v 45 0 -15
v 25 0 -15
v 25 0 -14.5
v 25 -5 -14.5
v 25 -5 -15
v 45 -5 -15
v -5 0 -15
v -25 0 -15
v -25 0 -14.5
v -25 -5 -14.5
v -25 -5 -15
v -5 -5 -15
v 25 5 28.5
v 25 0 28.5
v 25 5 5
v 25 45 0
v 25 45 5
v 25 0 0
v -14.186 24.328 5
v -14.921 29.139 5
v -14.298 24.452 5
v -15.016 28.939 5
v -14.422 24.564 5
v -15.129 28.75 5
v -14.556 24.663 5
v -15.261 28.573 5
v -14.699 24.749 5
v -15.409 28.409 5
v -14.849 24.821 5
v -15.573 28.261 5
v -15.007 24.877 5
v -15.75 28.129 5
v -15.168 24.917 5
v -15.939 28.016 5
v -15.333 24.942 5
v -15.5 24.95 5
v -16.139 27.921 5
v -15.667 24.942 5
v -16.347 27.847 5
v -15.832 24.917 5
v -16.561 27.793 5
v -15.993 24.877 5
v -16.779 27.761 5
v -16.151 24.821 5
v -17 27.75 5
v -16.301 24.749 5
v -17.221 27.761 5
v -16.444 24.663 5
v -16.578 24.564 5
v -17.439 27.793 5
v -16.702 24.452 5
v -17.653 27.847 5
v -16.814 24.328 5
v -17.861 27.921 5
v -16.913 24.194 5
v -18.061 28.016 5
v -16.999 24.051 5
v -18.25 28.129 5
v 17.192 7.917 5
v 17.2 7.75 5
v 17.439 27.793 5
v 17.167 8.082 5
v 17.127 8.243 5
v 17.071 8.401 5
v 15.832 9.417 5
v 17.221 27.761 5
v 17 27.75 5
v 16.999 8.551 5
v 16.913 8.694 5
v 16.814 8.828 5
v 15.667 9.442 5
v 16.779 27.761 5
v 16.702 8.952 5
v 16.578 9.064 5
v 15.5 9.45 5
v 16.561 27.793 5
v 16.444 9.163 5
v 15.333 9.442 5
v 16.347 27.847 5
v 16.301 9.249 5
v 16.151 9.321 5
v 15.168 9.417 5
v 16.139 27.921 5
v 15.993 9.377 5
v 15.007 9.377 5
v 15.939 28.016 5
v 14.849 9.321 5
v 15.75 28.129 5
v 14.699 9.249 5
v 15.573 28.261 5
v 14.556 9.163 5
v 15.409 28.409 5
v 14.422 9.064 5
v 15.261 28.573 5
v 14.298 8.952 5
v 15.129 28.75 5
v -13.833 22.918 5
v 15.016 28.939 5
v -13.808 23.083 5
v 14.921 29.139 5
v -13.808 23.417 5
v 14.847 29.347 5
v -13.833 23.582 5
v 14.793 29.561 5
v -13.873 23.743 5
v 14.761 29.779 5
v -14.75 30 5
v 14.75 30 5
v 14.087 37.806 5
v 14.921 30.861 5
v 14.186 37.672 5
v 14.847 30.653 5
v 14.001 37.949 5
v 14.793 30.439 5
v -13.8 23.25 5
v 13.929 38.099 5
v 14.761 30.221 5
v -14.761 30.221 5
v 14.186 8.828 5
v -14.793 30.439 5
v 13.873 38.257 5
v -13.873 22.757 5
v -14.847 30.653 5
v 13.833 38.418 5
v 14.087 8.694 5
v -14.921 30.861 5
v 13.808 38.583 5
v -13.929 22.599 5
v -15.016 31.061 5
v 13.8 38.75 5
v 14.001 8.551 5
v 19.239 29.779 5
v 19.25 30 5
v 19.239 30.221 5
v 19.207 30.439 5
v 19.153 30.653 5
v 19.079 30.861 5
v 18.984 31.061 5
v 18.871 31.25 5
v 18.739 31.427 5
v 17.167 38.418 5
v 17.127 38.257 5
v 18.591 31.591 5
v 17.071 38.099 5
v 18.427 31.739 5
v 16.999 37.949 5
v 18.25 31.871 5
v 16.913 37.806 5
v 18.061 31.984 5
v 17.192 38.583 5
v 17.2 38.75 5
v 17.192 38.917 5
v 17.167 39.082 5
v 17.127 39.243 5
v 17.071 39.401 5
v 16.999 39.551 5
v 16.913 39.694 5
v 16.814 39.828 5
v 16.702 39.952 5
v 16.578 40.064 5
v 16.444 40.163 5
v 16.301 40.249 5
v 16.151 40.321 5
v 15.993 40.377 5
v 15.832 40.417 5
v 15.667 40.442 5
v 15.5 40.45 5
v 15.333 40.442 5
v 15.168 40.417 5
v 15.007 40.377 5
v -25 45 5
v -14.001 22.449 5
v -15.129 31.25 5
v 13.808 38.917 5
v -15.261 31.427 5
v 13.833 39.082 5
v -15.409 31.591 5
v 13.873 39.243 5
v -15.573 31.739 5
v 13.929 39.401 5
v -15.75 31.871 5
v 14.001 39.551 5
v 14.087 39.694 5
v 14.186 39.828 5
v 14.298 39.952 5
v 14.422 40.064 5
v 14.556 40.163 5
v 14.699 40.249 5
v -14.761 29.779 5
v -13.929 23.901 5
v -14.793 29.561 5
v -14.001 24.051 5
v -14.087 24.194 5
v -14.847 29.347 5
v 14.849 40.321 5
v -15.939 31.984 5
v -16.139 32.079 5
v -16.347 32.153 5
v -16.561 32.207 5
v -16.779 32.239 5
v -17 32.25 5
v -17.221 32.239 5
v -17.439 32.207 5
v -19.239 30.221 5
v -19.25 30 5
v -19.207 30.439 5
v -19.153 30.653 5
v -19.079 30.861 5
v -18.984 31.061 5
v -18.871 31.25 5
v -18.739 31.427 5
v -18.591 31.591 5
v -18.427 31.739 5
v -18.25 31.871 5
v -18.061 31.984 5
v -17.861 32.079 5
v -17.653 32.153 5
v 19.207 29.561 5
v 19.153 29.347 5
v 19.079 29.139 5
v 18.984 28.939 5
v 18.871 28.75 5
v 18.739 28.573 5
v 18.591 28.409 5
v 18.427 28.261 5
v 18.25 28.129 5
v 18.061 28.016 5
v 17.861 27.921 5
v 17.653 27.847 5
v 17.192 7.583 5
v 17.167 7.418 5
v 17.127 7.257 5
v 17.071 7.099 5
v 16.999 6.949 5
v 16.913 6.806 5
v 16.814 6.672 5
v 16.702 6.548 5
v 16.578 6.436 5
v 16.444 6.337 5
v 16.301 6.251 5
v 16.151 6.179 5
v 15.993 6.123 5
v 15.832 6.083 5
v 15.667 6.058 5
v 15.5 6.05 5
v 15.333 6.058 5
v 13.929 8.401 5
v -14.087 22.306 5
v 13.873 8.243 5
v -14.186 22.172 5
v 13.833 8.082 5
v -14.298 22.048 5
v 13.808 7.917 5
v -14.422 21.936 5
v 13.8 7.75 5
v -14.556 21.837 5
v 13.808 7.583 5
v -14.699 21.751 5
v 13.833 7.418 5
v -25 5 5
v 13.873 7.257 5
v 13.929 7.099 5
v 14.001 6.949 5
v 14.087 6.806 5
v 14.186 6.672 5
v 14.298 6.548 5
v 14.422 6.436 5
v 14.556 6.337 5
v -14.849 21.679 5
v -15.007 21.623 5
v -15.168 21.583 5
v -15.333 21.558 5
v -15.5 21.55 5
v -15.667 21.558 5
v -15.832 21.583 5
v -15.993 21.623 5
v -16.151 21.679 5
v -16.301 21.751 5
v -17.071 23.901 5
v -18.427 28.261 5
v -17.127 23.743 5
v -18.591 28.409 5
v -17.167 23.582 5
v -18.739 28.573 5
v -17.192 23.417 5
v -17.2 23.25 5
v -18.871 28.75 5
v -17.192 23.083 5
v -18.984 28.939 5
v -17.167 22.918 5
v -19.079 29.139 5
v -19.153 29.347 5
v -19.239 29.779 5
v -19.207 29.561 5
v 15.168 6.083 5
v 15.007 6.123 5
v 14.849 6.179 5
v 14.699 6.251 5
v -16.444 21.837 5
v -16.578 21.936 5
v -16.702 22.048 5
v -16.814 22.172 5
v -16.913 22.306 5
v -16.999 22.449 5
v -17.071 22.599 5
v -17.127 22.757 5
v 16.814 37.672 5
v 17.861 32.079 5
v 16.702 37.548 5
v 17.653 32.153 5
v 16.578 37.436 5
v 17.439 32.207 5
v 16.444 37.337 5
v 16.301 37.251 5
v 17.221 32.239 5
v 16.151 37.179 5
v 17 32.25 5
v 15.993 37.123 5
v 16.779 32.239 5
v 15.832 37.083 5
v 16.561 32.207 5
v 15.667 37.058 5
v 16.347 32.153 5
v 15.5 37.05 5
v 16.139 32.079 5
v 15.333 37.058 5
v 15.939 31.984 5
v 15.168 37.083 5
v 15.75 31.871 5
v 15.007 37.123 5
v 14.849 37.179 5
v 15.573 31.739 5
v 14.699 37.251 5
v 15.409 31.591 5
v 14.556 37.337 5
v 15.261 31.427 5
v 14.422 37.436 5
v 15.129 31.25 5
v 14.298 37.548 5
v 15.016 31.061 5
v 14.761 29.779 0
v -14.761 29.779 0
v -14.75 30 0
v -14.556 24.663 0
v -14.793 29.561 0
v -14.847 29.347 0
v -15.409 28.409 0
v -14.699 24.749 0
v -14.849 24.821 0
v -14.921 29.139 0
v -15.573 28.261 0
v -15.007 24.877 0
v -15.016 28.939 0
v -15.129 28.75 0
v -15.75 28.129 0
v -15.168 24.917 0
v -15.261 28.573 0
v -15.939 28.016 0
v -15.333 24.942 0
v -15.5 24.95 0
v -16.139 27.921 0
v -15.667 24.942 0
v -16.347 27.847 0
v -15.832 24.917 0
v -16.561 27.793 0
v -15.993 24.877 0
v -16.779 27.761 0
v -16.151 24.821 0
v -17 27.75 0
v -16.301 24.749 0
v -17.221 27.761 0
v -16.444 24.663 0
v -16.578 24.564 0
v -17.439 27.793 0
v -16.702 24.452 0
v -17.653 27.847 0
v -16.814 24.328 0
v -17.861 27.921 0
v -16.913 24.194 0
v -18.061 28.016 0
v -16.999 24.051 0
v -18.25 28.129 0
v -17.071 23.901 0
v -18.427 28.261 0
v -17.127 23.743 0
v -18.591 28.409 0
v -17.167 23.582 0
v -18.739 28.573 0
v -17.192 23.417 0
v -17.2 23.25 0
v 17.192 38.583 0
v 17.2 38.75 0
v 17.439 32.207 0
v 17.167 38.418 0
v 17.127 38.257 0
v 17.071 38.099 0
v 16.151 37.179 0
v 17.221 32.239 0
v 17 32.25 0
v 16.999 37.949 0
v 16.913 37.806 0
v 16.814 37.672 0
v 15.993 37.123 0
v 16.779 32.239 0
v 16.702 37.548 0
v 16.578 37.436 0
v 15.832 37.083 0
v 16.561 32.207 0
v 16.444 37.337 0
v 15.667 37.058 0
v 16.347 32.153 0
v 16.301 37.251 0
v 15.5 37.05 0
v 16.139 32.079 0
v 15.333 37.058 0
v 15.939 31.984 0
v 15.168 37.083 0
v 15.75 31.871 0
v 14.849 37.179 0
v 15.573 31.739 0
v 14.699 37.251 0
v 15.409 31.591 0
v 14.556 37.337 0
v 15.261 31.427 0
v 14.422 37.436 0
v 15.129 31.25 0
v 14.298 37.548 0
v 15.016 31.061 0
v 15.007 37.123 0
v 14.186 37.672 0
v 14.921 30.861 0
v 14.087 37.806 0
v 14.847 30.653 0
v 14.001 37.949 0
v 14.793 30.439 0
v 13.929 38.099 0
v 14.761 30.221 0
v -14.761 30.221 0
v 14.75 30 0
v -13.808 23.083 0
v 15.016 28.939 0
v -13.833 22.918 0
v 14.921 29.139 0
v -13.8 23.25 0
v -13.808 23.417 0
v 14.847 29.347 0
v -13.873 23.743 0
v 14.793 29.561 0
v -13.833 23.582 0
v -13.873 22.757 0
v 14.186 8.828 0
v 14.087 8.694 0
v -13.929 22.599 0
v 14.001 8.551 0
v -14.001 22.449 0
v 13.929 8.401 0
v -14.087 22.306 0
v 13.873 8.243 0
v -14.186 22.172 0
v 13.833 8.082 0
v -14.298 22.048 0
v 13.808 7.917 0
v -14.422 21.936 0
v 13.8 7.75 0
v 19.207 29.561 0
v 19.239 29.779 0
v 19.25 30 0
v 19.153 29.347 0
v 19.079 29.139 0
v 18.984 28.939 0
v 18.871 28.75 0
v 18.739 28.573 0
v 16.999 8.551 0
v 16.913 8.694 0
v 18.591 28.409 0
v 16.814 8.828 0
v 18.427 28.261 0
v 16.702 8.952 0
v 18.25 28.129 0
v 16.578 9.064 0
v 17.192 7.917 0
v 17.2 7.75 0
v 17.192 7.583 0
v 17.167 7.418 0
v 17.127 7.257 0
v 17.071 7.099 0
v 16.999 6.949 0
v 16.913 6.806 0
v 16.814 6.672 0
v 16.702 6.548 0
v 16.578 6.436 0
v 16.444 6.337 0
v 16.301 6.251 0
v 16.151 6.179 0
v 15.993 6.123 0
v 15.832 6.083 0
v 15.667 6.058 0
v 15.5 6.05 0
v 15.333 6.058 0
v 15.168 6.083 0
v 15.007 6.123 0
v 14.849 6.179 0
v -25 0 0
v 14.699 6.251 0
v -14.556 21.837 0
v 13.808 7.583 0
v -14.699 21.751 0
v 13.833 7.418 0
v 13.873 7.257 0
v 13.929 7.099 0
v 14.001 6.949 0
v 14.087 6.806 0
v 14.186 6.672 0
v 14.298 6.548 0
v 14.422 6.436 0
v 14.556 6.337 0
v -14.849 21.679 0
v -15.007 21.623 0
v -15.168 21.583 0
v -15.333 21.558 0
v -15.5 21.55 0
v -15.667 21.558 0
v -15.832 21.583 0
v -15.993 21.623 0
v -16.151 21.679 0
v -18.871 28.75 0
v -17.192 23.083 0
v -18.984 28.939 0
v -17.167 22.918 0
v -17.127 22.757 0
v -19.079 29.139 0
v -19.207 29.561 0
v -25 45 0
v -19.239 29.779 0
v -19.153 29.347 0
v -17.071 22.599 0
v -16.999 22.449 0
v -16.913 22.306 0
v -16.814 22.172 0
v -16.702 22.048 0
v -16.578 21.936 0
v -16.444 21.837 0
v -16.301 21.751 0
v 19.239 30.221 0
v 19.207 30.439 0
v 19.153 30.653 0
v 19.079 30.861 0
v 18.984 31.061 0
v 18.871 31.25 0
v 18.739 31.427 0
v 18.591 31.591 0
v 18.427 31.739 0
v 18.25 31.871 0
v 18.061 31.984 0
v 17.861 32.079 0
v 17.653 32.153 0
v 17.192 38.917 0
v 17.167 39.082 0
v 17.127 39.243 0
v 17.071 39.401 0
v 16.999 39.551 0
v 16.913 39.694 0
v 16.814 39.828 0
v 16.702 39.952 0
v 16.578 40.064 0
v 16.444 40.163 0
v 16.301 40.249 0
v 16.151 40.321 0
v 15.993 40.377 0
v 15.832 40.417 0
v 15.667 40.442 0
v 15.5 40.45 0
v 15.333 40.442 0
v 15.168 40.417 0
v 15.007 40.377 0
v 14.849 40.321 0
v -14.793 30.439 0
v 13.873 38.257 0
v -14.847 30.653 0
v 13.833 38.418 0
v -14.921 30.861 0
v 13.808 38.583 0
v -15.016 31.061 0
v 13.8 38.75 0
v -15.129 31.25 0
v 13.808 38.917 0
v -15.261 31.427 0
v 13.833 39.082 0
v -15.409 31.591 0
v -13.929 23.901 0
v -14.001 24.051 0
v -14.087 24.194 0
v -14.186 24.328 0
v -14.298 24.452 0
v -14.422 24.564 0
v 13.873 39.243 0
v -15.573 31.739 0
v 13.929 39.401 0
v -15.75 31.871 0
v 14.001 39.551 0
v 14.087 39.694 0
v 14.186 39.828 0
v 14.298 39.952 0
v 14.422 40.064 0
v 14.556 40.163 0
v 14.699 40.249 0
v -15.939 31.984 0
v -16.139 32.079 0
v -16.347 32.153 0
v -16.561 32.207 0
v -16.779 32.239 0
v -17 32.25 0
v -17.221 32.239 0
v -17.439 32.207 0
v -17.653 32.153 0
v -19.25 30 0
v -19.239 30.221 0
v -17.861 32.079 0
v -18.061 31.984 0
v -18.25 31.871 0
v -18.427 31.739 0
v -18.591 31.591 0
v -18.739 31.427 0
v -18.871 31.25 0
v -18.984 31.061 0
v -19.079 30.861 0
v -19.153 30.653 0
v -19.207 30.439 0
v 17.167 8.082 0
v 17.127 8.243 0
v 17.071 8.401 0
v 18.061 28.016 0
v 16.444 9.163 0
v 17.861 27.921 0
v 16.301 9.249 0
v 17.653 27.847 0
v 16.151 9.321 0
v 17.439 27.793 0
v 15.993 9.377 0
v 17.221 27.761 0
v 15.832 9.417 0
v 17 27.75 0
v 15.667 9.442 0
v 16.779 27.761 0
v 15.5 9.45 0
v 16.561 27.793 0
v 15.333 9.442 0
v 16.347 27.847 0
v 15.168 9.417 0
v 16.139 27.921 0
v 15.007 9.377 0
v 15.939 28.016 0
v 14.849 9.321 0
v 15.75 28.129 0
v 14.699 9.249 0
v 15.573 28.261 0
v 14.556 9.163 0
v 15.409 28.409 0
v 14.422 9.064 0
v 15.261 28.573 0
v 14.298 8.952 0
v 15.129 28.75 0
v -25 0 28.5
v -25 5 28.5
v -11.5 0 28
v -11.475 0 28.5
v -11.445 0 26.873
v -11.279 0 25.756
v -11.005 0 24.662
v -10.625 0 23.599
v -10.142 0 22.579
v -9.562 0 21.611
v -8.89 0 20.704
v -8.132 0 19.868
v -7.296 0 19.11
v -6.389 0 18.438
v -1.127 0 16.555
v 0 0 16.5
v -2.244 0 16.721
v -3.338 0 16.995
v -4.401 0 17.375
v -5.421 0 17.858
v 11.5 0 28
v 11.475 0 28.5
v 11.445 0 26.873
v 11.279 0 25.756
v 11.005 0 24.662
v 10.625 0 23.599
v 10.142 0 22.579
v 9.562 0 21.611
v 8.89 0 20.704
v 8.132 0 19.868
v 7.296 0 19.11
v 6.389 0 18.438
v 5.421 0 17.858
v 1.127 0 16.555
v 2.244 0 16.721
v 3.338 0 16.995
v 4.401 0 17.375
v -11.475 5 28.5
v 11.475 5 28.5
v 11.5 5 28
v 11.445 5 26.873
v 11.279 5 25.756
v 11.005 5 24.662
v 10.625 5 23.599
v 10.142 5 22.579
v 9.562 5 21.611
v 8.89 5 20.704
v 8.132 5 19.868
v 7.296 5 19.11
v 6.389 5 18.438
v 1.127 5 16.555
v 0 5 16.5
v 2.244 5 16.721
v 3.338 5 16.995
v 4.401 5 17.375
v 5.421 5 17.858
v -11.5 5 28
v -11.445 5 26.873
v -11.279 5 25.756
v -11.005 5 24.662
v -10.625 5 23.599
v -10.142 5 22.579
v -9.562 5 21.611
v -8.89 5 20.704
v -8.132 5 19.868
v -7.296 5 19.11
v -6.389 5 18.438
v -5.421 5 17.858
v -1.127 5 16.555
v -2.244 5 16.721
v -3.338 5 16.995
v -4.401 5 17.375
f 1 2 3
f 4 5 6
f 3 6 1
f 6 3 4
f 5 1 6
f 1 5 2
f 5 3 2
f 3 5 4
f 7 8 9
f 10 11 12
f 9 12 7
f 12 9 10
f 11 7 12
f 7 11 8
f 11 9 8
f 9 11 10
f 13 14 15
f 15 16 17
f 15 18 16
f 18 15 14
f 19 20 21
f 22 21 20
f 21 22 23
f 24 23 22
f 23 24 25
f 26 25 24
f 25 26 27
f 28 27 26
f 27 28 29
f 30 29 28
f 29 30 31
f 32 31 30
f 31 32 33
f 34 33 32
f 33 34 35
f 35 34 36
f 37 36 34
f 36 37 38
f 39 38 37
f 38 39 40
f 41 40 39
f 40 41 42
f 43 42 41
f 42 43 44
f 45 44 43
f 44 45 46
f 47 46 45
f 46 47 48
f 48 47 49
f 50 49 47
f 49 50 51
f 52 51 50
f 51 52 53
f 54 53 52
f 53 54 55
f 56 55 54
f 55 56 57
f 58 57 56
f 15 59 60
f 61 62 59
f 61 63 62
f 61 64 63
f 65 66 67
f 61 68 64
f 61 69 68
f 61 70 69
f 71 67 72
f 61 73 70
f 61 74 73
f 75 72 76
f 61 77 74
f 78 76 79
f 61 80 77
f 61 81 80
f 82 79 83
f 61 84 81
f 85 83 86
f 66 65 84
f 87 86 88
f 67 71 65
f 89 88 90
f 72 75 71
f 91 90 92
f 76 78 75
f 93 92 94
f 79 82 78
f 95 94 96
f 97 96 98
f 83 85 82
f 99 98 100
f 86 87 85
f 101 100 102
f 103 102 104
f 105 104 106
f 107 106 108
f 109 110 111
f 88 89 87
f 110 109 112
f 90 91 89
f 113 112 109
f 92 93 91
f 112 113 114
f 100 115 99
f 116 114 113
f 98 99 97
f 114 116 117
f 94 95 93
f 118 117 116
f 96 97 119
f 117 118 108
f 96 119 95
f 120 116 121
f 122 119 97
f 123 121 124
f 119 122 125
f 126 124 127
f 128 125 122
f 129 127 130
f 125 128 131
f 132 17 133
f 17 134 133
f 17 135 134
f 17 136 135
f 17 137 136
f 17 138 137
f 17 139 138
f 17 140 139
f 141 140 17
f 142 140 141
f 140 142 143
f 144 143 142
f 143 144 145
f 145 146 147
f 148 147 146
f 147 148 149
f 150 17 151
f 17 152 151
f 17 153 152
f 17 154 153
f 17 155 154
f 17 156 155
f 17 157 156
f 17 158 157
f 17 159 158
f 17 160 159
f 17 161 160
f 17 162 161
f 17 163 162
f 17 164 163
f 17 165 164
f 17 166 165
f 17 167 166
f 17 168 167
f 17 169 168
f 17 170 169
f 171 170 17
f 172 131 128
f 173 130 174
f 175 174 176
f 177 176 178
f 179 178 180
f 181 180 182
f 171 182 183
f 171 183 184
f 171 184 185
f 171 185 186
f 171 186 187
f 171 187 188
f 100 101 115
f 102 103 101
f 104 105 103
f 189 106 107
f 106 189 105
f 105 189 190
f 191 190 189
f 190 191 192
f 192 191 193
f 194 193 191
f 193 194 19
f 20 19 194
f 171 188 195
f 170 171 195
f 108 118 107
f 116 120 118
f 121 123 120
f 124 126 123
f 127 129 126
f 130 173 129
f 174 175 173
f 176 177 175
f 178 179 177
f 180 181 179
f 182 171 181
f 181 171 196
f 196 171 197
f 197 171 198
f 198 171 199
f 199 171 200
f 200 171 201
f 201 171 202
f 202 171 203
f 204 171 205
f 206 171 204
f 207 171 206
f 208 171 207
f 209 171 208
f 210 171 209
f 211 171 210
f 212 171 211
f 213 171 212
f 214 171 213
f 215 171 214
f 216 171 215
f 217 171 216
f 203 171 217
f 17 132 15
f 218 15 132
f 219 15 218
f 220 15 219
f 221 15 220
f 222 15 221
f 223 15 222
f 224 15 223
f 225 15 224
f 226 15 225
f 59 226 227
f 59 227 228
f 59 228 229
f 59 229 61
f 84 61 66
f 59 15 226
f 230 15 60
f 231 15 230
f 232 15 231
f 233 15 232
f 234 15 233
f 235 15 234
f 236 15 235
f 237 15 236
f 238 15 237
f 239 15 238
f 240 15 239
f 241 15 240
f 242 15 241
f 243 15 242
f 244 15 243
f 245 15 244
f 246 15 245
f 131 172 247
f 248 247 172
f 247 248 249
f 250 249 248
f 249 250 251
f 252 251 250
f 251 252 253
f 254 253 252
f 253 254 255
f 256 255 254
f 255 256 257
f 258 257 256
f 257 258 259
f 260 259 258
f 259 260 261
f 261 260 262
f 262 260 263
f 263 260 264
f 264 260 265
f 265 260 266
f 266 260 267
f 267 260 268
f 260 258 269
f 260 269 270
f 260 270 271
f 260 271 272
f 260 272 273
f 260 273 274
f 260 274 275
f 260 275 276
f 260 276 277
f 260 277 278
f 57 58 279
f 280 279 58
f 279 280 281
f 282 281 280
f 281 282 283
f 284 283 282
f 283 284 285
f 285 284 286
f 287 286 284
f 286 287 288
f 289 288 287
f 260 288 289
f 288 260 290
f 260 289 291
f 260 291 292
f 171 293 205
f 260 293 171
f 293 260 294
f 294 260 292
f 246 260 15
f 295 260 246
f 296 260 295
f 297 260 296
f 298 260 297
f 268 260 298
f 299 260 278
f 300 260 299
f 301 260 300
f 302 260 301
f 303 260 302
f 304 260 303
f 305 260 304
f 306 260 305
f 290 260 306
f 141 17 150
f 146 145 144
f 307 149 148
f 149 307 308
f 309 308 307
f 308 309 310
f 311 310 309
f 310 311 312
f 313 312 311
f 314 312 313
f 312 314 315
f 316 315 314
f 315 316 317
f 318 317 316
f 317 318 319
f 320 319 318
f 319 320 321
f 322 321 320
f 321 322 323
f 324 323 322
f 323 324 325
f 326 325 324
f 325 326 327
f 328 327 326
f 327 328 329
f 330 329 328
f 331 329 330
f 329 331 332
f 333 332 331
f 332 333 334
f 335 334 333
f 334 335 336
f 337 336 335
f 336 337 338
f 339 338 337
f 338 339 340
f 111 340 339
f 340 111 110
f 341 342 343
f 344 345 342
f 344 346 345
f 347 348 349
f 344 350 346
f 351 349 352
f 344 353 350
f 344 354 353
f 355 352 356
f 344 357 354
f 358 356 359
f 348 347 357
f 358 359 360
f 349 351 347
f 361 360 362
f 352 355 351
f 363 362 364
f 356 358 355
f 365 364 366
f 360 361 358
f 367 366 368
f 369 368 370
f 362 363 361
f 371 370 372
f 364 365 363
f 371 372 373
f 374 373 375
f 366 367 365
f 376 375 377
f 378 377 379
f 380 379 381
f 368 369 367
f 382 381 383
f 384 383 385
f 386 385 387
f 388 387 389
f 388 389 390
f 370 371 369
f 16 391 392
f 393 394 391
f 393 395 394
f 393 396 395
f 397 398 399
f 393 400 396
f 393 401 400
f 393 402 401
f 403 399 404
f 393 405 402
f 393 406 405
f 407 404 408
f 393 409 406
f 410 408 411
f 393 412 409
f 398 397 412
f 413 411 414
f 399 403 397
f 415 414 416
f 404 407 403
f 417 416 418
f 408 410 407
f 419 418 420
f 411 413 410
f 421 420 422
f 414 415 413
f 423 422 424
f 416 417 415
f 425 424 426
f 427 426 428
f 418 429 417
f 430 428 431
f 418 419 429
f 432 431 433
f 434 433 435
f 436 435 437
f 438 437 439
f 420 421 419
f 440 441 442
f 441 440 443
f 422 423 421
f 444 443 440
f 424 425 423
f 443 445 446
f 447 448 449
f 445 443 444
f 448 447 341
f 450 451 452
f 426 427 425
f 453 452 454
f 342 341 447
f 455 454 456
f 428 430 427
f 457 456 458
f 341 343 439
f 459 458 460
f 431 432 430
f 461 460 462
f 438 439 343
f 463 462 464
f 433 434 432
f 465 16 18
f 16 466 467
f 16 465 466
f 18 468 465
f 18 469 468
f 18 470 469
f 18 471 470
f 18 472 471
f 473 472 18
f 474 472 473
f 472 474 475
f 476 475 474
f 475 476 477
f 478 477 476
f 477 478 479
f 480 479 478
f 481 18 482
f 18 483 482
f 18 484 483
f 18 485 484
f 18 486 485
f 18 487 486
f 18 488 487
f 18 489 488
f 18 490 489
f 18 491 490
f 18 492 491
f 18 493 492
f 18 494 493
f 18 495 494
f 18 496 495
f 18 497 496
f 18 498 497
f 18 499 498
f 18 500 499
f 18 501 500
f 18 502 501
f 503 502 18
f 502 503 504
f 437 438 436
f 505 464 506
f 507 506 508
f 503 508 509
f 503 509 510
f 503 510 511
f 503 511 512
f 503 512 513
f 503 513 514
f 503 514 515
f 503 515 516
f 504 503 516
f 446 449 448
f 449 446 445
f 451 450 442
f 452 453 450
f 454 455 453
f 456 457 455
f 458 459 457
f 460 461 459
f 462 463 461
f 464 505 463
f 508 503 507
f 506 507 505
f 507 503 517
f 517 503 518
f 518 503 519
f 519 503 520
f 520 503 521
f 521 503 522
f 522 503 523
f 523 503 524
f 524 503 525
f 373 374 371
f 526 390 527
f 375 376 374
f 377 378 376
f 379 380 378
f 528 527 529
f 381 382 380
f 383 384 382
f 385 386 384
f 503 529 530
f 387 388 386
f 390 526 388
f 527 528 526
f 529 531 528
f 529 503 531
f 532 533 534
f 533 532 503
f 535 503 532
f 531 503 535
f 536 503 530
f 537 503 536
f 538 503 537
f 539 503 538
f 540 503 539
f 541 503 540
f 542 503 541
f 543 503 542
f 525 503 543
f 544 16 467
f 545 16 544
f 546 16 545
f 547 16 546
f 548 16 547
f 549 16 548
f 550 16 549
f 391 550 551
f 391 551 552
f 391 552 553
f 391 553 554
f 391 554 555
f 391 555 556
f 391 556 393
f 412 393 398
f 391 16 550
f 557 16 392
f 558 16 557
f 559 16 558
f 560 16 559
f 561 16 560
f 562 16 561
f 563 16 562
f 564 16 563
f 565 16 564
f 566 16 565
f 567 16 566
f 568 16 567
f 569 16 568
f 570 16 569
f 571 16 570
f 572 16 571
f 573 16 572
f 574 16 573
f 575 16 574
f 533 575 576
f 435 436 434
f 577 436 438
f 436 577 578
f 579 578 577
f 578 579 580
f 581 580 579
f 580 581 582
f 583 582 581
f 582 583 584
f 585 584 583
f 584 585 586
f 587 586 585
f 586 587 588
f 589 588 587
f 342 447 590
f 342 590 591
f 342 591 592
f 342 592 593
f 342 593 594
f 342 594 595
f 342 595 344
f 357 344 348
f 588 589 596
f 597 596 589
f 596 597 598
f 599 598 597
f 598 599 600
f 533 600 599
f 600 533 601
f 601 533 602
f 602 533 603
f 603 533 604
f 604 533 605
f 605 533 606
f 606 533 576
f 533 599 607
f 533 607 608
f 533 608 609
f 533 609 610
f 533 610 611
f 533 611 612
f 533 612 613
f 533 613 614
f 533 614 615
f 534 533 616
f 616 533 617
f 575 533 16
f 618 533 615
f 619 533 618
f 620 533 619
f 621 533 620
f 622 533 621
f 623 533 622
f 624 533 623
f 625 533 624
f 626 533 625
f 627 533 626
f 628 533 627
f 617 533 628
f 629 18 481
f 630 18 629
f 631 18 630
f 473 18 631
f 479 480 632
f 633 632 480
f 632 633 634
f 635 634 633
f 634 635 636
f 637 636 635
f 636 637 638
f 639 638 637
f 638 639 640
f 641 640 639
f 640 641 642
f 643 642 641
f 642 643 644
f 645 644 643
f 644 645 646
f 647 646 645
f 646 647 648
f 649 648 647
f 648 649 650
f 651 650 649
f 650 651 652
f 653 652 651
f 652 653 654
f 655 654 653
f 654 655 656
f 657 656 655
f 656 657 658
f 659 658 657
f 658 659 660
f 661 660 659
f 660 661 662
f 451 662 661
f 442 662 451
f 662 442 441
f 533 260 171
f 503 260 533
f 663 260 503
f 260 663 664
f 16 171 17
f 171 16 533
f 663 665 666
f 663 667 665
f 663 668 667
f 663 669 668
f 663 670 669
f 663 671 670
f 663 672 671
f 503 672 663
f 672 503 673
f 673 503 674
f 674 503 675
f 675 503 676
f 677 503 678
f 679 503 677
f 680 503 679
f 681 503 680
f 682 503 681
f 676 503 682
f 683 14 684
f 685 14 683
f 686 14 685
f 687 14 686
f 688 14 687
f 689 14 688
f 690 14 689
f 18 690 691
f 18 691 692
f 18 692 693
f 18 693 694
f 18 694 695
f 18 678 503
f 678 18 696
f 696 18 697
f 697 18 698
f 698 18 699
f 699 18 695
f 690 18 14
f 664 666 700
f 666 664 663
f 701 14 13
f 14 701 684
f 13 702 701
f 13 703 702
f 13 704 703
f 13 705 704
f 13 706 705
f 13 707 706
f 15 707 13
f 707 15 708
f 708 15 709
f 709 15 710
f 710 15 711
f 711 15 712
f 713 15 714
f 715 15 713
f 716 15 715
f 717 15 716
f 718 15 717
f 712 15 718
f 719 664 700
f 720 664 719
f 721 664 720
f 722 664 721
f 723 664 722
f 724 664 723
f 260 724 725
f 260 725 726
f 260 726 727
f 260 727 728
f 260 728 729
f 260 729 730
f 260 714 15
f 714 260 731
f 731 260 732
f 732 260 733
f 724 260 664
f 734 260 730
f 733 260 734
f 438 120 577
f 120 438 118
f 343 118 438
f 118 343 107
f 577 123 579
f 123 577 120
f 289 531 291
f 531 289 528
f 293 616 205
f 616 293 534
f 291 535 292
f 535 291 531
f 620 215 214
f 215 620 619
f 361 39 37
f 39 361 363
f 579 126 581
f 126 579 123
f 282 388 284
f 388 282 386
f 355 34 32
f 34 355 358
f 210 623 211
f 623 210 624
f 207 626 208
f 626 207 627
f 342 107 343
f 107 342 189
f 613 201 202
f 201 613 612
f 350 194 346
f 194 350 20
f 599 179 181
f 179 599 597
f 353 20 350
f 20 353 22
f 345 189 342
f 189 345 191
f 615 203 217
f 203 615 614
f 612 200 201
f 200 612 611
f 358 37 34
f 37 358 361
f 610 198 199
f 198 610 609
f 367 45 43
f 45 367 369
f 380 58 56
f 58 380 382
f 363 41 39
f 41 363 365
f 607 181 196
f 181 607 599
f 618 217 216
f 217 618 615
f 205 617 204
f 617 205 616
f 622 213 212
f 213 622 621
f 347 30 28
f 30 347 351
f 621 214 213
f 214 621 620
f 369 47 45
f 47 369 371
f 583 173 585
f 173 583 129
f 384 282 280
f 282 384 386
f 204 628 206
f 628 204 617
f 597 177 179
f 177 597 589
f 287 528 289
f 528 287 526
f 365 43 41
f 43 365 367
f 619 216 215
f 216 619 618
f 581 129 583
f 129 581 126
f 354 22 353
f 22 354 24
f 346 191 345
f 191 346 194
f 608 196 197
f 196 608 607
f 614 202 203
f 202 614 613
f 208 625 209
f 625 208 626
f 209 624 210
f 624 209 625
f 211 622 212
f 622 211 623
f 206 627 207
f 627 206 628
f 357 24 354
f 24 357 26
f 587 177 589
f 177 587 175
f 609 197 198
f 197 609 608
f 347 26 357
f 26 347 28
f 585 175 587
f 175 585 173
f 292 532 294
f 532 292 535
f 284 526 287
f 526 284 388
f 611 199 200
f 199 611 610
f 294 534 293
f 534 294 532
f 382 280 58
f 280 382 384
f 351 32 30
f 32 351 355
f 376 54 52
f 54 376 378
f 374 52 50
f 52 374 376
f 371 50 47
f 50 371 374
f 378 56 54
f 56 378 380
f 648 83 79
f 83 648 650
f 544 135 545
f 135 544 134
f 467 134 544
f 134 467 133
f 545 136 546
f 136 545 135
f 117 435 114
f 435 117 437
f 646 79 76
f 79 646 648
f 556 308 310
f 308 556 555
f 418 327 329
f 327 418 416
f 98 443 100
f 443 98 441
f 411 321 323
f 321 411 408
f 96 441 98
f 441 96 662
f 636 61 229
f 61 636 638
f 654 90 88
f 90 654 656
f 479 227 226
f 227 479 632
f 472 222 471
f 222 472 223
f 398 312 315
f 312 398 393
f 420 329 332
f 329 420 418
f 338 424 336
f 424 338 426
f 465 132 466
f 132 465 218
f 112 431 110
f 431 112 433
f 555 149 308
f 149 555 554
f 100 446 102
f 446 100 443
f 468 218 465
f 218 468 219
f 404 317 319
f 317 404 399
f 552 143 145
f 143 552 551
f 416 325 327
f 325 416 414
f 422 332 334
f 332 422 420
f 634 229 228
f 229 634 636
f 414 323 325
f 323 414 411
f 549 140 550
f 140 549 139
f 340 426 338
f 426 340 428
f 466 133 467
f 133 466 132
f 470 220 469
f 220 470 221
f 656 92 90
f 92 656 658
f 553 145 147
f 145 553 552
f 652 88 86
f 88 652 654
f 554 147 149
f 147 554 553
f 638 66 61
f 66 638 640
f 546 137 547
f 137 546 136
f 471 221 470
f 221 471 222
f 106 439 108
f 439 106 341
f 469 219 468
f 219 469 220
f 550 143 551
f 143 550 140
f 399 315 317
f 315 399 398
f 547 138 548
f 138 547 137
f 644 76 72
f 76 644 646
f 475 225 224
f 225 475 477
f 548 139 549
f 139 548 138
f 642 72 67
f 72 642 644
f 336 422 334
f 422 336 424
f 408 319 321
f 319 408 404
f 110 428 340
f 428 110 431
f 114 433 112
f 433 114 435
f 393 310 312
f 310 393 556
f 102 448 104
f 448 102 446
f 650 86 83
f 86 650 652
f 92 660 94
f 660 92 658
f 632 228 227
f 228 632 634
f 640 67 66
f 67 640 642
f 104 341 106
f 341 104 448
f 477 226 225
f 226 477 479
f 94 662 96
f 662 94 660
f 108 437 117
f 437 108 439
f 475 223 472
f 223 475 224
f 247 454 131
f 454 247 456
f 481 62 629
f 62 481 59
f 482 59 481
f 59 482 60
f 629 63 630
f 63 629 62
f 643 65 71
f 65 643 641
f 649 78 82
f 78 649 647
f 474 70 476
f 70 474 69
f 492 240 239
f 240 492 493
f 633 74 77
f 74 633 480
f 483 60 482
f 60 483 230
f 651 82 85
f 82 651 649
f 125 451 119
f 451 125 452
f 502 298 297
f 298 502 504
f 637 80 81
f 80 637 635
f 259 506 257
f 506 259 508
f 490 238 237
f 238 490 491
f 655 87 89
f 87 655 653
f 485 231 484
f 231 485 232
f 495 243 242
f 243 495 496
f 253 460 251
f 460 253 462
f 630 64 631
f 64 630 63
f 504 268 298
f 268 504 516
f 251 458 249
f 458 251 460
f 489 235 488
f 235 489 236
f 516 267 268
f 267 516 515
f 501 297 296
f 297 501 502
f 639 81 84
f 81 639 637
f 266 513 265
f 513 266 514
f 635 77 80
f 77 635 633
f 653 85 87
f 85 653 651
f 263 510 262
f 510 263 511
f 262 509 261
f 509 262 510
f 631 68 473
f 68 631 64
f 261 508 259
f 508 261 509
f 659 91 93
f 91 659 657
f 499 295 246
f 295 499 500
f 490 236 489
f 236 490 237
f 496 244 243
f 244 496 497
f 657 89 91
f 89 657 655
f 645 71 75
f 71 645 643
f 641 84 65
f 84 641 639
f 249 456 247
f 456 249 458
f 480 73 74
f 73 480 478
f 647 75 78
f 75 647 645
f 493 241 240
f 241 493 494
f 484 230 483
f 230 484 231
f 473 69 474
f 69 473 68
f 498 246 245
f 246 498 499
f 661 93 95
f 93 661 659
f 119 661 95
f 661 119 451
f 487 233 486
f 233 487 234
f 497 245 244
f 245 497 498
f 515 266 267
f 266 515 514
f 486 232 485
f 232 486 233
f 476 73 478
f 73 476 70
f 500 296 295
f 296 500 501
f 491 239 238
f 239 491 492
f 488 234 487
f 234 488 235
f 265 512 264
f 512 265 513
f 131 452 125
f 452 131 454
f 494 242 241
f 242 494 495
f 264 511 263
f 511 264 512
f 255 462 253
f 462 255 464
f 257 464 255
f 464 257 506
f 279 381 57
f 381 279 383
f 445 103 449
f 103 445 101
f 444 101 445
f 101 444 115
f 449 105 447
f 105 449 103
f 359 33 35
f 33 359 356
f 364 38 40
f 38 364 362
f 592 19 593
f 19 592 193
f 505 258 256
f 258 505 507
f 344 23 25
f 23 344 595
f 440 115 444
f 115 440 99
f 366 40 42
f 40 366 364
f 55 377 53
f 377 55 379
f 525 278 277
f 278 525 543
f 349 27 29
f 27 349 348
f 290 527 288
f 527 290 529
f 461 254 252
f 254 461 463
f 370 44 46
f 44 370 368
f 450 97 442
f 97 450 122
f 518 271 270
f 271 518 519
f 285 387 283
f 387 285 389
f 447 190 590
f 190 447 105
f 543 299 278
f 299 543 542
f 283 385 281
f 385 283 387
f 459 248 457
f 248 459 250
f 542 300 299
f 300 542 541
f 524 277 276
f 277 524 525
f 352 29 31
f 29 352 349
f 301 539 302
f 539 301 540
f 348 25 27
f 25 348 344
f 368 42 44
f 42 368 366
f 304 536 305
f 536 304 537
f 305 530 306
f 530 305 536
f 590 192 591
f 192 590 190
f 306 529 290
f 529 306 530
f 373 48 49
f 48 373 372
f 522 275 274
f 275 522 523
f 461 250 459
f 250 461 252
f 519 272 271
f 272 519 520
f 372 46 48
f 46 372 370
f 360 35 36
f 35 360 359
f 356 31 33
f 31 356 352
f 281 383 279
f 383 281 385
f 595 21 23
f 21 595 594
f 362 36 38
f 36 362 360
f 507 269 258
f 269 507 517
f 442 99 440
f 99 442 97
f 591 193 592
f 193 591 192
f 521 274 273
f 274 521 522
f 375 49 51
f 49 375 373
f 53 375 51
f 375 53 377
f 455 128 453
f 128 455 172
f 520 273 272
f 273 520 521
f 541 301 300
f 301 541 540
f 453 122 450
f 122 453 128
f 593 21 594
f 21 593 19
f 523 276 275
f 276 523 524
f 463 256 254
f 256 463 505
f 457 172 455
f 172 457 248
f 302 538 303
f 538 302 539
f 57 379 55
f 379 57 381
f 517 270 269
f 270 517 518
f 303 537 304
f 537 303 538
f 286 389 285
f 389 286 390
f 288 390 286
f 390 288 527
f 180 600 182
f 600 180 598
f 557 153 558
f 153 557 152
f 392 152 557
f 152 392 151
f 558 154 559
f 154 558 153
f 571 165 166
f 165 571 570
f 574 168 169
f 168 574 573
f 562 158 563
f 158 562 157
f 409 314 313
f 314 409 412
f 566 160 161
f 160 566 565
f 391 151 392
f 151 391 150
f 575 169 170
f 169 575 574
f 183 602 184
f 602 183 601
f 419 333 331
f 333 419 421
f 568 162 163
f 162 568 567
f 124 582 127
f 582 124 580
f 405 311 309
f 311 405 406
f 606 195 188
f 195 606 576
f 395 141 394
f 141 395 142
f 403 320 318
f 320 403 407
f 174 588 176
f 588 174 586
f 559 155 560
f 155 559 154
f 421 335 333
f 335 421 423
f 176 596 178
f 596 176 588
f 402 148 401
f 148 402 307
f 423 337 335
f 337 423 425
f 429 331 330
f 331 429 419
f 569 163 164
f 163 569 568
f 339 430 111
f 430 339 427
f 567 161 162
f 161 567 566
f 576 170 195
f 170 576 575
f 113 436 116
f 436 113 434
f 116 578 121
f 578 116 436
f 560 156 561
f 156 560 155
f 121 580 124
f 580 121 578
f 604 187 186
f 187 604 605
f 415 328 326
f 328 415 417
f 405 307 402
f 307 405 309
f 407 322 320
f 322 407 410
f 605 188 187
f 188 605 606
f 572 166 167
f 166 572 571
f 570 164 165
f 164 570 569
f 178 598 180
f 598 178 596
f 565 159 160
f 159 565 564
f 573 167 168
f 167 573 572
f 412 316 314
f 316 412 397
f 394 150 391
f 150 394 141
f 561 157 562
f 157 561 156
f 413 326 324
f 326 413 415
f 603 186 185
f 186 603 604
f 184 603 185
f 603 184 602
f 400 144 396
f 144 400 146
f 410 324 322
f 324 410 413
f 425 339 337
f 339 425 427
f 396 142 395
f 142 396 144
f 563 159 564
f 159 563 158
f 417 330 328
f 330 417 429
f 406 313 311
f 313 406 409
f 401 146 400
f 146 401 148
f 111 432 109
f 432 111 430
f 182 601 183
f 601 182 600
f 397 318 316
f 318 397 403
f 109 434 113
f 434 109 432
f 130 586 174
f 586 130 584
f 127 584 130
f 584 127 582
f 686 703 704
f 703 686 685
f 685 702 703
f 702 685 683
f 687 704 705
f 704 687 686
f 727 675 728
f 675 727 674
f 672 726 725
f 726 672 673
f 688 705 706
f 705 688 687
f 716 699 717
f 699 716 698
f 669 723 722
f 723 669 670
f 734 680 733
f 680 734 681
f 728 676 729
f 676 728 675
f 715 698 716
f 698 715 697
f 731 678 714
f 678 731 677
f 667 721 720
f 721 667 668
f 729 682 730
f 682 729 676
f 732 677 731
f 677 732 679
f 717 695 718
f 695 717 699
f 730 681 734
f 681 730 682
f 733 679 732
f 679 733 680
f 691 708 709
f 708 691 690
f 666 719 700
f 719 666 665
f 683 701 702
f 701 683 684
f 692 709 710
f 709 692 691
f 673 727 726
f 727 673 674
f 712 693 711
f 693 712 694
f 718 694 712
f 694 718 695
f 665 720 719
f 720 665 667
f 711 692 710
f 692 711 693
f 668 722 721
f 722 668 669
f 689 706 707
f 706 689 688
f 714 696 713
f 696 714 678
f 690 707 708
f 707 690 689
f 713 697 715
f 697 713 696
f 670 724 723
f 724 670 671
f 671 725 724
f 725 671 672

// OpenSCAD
// L-shaped mounting bracket for a NEMA 17 stepper motor (e.g. syringe pump)
// Print orientation: base plate lies flat on the bed, motor plate builds upward (+Z)

$fn = 64;

// ---------------- Dimensions (mm) ----------------
base_x0      = -25;   // base plate: x start
base_x1      = 25;    // base plate: x end
base_y1      = 45;    // base plate: y end (y0 = 0)
base_z1      = 5;     // base plate: z end
hole_d4      = 4.5;   // M4 through-hole diameter
hole_x4      = 17;    // M4 hole centre, x (+/-)
hole_y4      = 30;    // M4 hole centre, y
hole_d3      = 3.4;   // M3 screw hole diameter
hole_pitch   = 31;    // square pattern pitch for M3 holes
hole_z3      = 28;    // motor boss hole centre height (z)
boss_d       = 23;    // motor centring boss hole diameter
gusset_w     = 5;     // gusset thickness (X)
gusset_leg   = 20;    // right triangle leg length (Y and Z)
gusset_x0    = -25;   // gusset left edge (x)
gusset_x1    = 20;    // gusset right edge (x)
overlap      = 0.5;   // plate overlap / cutter overshoot

// ---------------- Model ----------------
difference() {
    union() {
        // Base plate
        translate([base_x0, 0, 0])
            cube([base_x1 - base_x0, base_y1, base_z1]);

        // Vertical motor plate (on back edge)
        translate([base_x0, 0, 0])
            cube([base_x1 - base_x0, base_z1, hole_z3 + overlap]);

        // Gussets: right triangle in YZ, flush with left/right edges
        for (sx = [-1, 1])
            translate([sx * gusset_x0, 0, 0])
                rotate([90, 0, 0])
                    linear_extrude(height = gusset_w)
                        polygon([[0, base_z1 - gusset_leg],
                                 [gusset_leg, base_z1 - gusset_leg],
                                 [0, base_z1 - gusset_leg + overlap]]);
    }

    // M4 through-holes
    for (sx = [-1, 1])
        translate([sx * hole_x4, hole_y4, -overlap])
            cylinder(d = hole_d4, h = base_z1 + 2 * overlap);

    // Motor boss hole (along Y), centred on x = 0, z = 28
    translate([0, -overlap, hole_z3])
        rotate([-90, 0, 0])
            cylinder(d = boss_d, h = base_y1 + 2 * overlap);

    // M3 screw holes on 31 mm square pattern
    for (i = [0 : 3]) {
        x = (i % 2 - 0.5) * hole_pitch;
        y = (i / 2 - 0.25) * hole_pitch;
        translate([x, y, -overlap])
            cylinder(d = hole_d3, h = hole_z3 + 2 * overlap);
    }
}
